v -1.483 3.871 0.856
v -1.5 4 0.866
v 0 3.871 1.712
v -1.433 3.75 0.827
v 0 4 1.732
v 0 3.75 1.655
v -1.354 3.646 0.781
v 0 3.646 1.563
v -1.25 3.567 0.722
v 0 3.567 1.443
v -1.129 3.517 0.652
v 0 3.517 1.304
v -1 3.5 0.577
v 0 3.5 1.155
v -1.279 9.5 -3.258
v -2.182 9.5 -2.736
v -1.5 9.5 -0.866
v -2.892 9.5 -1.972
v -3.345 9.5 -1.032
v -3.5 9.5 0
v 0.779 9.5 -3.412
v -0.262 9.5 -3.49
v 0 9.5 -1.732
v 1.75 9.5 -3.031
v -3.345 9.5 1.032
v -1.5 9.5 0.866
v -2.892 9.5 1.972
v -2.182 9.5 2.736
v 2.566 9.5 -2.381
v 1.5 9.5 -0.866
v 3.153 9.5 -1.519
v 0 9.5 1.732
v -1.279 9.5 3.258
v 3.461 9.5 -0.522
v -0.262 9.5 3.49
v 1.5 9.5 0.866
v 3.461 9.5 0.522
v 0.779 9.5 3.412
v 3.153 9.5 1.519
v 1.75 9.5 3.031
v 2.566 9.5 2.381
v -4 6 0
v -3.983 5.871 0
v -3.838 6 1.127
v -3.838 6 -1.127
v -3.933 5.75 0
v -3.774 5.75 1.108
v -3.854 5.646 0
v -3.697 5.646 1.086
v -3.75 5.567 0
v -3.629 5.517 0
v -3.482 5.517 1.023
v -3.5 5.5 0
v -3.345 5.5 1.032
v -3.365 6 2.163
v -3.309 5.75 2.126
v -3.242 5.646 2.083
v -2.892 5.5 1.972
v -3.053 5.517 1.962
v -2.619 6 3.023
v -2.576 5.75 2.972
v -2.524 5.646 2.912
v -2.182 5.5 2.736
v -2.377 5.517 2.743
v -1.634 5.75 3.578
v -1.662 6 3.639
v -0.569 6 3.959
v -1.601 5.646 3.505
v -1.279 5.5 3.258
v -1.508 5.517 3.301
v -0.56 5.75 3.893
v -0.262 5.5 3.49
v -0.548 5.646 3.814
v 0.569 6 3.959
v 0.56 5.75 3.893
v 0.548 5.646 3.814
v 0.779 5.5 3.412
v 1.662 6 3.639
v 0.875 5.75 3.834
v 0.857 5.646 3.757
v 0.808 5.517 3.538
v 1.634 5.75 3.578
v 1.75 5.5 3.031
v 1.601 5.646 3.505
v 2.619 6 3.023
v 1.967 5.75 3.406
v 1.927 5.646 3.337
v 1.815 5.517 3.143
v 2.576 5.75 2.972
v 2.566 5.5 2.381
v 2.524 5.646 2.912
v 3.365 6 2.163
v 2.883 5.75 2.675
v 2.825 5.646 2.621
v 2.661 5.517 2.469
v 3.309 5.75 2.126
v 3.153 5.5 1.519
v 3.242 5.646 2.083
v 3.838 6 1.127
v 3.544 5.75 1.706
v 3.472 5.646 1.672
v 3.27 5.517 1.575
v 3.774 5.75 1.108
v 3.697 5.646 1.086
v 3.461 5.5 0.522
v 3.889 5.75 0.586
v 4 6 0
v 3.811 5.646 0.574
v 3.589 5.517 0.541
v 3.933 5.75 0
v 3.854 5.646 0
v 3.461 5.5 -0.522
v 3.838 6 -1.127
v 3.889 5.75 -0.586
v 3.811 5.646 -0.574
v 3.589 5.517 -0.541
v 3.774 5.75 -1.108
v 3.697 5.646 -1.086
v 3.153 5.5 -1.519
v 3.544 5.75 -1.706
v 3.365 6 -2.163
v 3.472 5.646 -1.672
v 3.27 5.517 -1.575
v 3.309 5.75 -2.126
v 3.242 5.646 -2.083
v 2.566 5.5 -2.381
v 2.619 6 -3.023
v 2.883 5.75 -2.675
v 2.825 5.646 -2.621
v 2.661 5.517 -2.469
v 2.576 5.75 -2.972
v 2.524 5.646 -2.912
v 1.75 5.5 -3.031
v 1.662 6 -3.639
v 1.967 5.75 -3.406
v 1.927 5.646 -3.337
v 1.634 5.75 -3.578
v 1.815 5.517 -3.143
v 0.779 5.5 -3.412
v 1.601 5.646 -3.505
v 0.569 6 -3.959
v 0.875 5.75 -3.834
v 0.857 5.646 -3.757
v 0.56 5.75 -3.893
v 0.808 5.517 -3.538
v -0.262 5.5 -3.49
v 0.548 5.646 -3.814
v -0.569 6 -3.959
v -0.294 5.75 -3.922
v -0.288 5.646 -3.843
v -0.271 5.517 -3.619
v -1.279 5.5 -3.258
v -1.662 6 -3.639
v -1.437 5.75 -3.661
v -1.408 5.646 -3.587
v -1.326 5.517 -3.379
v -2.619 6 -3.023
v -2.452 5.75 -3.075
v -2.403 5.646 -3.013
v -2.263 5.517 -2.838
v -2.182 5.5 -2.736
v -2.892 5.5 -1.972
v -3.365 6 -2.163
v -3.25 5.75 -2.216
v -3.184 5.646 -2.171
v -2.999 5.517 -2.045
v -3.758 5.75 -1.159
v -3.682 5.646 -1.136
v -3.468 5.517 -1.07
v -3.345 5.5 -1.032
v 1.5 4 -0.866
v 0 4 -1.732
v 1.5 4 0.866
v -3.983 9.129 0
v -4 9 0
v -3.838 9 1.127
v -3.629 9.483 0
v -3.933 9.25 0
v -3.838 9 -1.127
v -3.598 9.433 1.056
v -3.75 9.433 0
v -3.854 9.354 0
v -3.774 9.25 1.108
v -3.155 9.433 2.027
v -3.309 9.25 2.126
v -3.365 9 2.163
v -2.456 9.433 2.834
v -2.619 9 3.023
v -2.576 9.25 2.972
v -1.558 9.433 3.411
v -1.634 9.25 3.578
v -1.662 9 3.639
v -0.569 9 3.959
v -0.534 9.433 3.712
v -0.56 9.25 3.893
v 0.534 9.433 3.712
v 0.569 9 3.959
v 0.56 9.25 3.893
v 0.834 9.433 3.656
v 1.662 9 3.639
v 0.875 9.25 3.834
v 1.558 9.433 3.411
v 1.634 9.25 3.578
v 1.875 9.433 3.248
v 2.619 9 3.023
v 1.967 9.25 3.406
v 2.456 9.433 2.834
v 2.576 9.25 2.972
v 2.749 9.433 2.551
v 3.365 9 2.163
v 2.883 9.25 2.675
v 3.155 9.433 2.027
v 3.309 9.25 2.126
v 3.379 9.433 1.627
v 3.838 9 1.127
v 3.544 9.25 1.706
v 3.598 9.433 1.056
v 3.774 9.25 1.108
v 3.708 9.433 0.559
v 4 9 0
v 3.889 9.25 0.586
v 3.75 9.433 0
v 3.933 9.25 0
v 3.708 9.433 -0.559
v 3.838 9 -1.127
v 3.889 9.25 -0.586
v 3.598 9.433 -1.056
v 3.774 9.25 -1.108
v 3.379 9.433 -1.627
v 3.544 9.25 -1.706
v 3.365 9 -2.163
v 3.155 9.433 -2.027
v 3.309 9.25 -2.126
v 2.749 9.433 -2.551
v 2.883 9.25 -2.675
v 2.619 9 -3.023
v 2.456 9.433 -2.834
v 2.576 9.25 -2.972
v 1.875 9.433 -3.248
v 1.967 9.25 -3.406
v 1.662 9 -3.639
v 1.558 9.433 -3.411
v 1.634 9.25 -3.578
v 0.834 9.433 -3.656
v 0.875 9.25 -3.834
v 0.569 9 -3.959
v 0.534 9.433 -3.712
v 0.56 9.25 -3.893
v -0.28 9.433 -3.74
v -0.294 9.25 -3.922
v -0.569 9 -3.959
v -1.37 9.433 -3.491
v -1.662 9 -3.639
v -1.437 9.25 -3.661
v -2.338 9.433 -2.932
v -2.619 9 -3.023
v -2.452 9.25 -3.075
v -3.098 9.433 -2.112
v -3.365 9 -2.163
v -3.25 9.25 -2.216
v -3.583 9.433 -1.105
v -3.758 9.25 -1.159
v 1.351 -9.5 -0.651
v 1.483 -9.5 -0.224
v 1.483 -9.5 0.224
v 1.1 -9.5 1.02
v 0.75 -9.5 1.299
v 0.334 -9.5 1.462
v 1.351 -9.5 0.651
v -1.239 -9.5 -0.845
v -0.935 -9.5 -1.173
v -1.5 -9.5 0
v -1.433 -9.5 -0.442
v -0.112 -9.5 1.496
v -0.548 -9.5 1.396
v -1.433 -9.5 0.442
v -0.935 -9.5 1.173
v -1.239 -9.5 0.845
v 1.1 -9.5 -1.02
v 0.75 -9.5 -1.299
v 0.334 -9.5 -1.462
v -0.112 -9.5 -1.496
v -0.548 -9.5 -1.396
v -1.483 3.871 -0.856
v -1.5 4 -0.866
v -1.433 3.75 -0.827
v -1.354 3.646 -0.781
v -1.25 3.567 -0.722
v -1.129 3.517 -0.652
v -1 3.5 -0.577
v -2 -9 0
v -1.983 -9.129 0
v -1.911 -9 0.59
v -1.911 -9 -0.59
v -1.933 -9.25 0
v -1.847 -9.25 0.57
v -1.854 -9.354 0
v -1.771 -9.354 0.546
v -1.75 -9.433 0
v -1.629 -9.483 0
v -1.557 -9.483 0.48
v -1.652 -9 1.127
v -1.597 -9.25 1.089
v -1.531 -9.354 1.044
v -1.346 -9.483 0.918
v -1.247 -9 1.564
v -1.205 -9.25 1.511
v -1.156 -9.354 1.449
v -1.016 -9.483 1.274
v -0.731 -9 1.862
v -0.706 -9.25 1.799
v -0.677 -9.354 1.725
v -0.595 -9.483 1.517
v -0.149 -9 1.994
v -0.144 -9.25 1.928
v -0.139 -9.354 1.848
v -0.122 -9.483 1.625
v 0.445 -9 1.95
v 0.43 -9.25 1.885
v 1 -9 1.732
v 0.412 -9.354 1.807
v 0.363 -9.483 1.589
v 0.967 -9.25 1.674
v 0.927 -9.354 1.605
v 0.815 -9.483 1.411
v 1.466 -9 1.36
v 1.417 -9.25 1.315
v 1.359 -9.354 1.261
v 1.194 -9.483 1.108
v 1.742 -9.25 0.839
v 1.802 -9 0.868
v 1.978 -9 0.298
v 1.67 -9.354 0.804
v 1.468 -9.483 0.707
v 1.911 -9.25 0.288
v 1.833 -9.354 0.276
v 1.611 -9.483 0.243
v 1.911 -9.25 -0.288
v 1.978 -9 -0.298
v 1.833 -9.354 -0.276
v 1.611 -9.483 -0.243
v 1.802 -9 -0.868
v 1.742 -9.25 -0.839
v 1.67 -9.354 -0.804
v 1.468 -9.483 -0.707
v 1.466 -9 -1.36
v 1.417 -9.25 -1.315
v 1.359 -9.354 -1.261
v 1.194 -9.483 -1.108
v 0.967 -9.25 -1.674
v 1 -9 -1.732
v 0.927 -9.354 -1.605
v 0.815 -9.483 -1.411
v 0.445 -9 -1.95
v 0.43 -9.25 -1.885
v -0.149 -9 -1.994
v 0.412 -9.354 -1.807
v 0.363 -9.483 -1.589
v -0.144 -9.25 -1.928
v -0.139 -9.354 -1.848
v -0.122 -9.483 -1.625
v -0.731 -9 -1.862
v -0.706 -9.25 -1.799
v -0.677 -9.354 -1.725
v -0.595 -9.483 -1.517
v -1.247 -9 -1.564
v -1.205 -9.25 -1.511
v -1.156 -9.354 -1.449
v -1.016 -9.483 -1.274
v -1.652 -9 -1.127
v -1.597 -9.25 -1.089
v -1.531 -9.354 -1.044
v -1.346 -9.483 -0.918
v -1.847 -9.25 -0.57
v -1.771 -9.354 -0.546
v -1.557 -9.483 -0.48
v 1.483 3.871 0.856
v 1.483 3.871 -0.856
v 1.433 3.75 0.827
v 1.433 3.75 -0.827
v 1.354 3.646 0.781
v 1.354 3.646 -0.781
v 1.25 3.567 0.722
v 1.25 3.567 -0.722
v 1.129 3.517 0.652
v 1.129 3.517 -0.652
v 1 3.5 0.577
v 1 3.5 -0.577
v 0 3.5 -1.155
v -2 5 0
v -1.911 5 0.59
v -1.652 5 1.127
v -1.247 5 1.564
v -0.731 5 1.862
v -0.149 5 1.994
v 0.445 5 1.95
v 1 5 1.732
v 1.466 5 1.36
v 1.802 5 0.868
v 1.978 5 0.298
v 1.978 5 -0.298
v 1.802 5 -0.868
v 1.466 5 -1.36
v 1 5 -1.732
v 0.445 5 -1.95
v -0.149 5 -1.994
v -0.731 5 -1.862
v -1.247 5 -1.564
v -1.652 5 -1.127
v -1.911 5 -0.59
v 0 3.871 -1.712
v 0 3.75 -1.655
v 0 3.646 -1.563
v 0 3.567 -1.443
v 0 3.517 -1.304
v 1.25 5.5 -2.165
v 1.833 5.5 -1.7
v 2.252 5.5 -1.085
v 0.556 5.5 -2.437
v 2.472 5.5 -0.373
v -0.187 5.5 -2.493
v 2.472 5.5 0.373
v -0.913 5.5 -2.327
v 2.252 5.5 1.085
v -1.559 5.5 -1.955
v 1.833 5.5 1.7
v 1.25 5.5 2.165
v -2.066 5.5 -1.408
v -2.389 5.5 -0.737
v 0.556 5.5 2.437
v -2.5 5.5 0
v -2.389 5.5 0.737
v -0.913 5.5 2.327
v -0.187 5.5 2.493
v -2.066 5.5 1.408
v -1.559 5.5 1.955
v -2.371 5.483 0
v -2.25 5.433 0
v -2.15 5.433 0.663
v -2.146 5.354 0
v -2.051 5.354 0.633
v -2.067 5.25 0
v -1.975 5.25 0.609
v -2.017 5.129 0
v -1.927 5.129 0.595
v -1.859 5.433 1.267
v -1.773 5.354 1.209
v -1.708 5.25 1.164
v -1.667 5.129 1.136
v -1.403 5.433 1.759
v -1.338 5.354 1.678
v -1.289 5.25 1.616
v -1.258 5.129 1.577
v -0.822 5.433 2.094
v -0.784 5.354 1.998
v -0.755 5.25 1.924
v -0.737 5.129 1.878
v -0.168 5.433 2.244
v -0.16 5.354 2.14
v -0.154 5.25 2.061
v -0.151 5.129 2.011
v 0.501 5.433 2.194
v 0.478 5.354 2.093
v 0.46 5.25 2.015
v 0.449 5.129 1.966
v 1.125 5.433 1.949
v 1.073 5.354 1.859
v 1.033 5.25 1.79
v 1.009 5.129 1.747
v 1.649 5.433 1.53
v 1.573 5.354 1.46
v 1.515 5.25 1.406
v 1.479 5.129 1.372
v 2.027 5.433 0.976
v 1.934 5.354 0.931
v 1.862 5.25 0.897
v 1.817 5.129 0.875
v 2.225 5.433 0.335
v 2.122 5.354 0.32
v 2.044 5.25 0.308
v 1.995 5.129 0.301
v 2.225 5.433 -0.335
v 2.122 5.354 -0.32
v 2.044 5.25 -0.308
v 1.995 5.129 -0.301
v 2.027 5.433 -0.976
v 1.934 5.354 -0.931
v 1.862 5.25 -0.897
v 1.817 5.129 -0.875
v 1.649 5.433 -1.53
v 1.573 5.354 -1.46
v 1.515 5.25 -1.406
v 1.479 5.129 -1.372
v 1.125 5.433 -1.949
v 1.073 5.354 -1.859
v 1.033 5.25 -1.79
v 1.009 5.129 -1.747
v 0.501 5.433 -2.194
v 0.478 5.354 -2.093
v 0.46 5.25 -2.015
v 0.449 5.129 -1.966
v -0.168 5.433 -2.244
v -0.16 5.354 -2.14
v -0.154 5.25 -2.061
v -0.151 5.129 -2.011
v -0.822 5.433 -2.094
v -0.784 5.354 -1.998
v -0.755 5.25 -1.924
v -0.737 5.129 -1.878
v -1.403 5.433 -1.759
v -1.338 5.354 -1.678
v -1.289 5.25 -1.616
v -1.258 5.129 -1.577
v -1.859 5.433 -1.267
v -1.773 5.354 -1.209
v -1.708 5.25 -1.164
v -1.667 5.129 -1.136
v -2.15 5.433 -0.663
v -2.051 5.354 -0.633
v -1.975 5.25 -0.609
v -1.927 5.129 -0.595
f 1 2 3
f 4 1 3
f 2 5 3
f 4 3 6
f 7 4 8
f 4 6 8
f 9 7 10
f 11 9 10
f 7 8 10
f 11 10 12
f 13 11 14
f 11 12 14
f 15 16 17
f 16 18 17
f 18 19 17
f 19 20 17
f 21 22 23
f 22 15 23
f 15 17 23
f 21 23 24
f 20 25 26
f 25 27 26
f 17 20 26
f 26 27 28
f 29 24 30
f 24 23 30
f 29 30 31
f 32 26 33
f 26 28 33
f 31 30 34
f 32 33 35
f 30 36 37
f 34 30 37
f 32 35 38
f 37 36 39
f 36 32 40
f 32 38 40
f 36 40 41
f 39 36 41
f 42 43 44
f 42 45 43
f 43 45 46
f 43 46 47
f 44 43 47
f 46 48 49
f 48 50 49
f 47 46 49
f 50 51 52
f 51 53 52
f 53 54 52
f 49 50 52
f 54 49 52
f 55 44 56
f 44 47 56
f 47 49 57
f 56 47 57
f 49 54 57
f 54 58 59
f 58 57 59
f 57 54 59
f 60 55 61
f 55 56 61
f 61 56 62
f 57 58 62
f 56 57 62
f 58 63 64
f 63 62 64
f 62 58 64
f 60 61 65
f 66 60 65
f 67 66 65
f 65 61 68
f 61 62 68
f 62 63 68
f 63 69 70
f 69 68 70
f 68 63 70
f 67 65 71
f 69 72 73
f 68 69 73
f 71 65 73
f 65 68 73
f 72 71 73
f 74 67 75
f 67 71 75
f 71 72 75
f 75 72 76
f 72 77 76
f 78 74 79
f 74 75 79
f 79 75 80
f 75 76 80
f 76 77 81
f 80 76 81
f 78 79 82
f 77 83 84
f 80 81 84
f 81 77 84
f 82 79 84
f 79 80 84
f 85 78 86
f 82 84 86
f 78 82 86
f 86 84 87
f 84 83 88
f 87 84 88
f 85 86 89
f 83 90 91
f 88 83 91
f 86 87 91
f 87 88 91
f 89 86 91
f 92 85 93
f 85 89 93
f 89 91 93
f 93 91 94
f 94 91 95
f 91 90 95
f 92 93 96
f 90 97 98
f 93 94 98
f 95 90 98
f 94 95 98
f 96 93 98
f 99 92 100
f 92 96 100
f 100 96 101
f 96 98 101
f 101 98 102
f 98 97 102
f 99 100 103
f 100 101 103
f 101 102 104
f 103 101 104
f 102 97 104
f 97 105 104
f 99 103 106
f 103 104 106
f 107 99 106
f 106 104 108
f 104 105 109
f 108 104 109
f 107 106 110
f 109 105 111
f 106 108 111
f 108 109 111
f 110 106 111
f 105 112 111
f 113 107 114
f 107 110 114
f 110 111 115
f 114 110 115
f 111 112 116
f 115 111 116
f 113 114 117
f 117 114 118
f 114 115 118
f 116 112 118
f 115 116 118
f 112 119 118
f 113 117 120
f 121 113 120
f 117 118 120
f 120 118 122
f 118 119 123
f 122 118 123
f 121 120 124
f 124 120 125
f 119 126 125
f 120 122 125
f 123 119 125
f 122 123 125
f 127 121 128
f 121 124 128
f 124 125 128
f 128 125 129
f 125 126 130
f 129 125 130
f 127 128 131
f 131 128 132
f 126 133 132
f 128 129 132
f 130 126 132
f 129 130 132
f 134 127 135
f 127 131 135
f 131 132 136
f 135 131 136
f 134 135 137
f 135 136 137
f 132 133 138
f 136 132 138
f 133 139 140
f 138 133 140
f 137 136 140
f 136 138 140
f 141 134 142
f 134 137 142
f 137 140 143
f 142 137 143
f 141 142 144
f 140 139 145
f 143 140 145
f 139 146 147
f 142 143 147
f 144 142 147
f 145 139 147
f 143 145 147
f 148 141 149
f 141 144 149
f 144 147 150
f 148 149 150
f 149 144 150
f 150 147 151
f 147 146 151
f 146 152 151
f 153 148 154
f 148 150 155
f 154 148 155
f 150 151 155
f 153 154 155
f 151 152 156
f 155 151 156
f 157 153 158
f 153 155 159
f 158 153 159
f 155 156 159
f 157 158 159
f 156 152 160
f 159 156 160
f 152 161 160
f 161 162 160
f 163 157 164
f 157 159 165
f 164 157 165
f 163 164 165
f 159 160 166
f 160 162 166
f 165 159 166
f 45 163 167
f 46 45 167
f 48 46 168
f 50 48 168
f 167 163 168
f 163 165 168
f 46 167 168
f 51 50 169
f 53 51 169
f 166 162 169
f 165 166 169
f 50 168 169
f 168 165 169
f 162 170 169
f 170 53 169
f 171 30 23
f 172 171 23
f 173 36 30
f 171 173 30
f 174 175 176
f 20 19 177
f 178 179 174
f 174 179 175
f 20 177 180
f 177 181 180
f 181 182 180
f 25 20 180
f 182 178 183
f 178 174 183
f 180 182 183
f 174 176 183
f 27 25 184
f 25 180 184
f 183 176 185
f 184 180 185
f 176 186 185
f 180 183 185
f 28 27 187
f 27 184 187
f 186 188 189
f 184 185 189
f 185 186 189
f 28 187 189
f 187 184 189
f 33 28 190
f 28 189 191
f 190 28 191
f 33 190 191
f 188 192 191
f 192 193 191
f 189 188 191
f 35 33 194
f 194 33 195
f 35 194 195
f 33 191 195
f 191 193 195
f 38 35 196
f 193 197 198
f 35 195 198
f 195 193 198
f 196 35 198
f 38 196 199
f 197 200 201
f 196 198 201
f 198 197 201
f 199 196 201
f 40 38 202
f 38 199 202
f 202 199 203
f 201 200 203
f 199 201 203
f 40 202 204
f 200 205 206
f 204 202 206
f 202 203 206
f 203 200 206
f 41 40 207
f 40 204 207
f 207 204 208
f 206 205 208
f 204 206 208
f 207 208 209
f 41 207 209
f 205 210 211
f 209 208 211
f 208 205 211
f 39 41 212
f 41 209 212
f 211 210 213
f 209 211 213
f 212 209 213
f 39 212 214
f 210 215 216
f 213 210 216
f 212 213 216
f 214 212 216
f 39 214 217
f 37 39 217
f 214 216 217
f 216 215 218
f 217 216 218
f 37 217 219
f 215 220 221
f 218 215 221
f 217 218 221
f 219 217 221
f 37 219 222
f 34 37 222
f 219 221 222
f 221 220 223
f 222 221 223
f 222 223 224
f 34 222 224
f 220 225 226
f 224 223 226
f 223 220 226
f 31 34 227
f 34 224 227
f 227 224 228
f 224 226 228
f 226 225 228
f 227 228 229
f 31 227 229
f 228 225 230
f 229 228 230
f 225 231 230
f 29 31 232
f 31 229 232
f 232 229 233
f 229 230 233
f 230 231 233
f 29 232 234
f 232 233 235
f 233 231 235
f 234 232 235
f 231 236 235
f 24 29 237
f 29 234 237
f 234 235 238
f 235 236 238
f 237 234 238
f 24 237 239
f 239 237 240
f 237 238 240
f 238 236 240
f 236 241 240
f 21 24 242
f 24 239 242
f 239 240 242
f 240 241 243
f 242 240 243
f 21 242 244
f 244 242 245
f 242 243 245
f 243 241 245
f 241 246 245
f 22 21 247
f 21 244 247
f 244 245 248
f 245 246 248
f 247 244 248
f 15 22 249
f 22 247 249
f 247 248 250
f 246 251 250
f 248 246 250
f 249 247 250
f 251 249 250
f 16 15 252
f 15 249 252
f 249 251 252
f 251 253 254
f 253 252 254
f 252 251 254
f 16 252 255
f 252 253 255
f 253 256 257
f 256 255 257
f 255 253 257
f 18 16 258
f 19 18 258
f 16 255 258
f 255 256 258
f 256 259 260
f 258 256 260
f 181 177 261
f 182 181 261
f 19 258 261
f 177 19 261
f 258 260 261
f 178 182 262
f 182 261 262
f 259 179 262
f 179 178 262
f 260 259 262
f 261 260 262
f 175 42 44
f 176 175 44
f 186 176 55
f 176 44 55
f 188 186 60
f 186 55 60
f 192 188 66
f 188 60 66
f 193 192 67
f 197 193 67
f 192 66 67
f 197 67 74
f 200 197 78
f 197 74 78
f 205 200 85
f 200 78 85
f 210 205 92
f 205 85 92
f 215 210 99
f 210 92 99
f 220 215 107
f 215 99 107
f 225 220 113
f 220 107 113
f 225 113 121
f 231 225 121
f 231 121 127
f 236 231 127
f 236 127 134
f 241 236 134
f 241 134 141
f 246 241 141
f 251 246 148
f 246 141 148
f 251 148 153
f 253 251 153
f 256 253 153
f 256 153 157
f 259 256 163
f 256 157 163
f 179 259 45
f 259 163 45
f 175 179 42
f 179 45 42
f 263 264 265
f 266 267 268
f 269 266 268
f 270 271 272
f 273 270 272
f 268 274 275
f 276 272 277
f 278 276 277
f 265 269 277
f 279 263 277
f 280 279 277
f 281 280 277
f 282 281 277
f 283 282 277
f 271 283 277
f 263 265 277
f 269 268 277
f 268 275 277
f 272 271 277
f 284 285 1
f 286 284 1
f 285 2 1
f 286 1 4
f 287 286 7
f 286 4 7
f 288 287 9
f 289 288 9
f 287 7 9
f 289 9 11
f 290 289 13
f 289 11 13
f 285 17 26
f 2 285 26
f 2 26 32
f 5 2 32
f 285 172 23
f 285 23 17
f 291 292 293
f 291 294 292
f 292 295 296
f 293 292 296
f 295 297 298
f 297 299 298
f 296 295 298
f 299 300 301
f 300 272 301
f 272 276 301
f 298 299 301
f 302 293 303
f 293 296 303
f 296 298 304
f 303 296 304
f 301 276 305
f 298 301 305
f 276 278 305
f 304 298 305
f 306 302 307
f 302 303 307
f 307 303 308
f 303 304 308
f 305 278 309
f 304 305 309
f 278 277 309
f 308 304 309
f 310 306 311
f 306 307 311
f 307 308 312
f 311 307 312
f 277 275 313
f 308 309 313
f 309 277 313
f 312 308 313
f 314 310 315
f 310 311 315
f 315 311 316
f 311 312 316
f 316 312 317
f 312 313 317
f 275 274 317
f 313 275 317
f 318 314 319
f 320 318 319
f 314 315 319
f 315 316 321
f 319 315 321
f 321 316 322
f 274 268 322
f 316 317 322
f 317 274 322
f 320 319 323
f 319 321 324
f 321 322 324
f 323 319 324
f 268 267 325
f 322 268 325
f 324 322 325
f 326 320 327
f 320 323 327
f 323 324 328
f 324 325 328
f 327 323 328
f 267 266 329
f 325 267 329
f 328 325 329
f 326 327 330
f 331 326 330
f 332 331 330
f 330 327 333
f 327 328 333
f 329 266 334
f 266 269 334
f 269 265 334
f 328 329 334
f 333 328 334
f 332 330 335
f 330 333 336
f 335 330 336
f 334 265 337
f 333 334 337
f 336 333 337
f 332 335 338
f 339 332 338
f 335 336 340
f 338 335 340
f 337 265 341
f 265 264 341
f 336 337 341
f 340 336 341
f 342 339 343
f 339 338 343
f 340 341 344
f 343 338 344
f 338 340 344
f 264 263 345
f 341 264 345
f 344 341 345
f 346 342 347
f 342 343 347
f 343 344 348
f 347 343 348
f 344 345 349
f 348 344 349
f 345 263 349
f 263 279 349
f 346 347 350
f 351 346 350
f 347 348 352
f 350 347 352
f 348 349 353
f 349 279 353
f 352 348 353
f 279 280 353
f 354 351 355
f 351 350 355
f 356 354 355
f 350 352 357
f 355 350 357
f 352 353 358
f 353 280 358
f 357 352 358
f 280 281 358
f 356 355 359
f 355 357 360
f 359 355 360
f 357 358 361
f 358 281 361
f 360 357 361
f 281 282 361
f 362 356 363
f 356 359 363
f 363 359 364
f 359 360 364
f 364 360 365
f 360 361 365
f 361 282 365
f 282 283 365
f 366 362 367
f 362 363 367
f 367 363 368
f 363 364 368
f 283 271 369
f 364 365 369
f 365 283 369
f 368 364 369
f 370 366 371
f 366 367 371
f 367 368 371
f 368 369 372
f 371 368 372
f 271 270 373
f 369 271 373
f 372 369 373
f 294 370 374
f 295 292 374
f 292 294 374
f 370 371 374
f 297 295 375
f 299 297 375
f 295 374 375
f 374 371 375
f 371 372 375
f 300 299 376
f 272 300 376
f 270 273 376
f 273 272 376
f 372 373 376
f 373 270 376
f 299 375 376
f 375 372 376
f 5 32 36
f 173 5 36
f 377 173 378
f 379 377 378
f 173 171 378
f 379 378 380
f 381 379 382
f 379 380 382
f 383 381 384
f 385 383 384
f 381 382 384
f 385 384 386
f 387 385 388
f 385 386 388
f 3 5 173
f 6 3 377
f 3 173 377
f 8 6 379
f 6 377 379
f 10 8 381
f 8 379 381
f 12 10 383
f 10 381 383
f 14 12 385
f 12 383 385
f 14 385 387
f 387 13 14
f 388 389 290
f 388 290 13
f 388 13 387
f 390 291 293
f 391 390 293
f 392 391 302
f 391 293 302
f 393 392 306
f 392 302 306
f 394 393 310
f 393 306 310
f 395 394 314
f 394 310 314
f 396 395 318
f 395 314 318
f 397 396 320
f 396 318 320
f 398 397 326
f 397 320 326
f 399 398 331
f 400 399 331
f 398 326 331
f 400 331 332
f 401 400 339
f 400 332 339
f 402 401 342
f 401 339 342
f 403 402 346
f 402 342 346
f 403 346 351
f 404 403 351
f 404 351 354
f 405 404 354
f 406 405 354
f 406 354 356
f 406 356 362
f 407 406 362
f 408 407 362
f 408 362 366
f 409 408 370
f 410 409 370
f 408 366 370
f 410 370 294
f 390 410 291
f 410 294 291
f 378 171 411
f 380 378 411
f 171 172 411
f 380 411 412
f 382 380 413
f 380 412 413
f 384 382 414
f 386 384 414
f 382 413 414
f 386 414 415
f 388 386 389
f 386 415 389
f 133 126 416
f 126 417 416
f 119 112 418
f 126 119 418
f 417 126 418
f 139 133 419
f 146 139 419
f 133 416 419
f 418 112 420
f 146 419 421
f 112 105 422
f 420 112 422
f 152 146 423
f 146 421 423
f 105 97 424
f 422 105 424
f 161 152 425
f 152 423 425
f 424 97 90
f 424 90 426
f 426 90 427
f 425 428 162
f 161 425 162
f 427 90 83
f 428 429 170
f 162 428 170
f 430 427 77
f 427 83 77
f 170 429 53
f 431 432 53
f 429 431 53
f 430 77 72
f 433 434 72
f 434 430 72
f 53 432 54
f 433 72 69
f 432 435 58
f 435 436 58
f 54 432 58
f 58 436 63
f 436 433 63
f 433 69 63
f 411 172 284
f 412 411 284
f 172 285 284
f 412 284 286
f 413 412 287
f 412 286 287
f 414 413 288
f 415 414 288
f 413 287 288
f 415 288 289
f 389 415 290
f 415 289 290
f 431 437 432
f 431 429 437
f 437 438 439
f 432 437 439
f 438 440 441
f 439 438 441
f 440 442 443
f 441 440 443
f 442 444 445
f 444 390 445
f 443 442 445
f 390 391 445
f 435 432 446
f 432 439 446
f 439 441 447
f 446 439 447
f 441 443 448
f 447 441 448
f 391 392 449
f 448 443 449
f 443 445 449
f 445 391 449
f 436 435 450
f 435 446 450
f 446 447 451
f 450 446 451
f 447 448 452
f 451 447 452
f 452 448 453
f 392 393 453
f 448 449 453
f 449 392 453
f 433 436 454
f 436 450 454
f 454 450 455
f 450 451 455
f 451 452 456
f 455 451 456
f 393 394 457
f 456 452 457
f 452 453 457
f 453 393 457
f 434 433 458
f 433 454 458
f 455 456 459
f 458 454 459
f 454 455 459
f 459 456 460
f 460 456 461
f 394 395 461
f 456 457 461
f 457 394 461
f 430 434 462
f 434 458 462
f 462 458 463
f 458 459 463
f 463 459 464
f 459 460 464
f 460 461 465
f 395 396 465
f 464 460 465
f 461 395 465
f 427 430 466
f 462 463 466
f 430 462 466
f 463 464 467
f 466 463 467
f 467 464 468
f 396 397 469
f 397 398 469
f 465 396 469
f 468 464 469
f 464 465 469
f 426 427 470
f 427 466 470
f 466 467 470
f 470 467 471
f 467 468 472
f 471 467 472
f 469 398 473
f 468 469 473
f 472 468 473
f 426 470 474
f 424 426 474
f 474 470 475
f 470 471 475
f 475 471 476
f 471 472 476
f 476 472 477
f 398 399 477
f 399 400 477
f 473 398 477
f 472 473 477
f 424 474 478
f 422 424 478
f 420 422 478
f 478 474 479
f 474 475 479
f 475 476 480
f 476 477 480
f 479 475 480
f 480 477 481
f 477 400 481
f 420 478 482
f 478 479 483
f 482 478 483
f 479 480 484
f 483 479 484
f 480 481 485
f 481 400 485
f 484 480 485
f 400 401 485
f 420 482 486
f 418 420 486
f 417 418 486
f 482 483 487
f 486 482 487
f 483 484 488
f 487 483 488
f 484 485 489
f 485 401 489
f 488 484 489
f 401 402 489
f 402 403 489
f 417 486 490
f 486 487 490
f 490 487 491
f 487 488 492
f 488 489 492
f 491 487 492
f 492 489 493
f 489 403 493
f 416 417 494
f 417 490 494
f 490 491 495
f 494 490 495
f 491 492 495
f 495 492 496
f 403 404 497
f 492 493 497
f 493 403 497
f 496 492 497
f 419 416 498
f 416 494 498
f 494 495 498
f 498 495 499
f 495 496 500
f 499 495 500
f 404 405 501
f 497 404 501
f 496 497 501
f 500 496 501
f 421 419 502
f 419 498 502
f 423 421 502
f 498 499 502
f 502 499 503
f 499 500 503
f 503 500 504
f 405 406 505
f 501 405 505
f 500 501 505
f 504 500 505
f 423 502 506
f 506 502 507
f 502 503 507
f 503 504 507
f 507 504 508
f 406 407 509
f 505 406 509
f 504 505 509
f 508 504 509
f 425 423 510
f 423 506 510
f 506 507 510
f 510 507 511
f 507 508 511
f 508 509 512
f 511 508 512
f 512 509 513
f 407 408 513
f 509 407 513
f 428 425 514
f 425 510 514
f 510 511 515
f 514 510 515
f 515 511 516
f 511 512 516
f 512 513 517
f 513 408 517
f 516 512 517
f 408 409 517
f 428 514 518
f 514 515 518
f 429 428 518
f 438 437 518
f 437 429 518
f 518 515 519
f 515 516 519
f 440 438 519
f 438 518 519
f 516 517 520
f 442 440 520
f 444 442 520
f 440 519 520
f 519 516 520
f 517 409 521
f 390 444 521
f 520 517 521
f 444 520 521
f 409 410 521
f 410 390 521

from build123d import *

# Parameters (mm, degrees)
CORTE_EXTRUS_O1_DEPTH = 6
FILETE1_R             = 0.5


with BuildPart() as part:
    # Esboço1 → Revolução1 (revolve)
    with BuildSketch(Plane.XY):
        Polygon((0, -9.5), (0, 9.5), (-4, 9.5), (-4, 5.5), (-2, 5.5), (-2, -9.5), align=None)
    revolve(axis=Axis((0, -9.5, 0), (0, 1, 0)))

    # Esboço2 → Corte-extrusão1 (cut)
    with BuildSketch(Plane(origin=(0, 9.5, 0), x_dir=(1, 0, 0), z_dir=(0, 1, 0))):
        Polygon((1.5, -0.866025404), (1.5, 0.866025404), (0, 1.732050808), (-1.5, 0.866025404), (-1.5, -0.866025404), (0, -1.732050808), align=None)
    extrude(amount=-CORTE_EXTRUS_O1_DEPTH, mode=Mode.SUBTRACT)

    # Filete1
    filete1_edges = [part.edges().sort_by_distance(p)[0] for p in [
        (0.75, 3.5, 1.299038106),
        (-0.75, 3.5, 1.299038106),
        (-1.5, 3.5, 0),
        (-0.75, 3.5, -1.299038106),
        (0.75, 3.5, -1.299038106),
        (1.5, 3.5, 0),
        (2, -9.5, 0),
        (2, 5.5, 0),
        (4, 5.5, 0),
        (4, 9.5, 0),
    ]]
    fillet(filete1_edges, radius=FILETE1_R)


solid = part.part
